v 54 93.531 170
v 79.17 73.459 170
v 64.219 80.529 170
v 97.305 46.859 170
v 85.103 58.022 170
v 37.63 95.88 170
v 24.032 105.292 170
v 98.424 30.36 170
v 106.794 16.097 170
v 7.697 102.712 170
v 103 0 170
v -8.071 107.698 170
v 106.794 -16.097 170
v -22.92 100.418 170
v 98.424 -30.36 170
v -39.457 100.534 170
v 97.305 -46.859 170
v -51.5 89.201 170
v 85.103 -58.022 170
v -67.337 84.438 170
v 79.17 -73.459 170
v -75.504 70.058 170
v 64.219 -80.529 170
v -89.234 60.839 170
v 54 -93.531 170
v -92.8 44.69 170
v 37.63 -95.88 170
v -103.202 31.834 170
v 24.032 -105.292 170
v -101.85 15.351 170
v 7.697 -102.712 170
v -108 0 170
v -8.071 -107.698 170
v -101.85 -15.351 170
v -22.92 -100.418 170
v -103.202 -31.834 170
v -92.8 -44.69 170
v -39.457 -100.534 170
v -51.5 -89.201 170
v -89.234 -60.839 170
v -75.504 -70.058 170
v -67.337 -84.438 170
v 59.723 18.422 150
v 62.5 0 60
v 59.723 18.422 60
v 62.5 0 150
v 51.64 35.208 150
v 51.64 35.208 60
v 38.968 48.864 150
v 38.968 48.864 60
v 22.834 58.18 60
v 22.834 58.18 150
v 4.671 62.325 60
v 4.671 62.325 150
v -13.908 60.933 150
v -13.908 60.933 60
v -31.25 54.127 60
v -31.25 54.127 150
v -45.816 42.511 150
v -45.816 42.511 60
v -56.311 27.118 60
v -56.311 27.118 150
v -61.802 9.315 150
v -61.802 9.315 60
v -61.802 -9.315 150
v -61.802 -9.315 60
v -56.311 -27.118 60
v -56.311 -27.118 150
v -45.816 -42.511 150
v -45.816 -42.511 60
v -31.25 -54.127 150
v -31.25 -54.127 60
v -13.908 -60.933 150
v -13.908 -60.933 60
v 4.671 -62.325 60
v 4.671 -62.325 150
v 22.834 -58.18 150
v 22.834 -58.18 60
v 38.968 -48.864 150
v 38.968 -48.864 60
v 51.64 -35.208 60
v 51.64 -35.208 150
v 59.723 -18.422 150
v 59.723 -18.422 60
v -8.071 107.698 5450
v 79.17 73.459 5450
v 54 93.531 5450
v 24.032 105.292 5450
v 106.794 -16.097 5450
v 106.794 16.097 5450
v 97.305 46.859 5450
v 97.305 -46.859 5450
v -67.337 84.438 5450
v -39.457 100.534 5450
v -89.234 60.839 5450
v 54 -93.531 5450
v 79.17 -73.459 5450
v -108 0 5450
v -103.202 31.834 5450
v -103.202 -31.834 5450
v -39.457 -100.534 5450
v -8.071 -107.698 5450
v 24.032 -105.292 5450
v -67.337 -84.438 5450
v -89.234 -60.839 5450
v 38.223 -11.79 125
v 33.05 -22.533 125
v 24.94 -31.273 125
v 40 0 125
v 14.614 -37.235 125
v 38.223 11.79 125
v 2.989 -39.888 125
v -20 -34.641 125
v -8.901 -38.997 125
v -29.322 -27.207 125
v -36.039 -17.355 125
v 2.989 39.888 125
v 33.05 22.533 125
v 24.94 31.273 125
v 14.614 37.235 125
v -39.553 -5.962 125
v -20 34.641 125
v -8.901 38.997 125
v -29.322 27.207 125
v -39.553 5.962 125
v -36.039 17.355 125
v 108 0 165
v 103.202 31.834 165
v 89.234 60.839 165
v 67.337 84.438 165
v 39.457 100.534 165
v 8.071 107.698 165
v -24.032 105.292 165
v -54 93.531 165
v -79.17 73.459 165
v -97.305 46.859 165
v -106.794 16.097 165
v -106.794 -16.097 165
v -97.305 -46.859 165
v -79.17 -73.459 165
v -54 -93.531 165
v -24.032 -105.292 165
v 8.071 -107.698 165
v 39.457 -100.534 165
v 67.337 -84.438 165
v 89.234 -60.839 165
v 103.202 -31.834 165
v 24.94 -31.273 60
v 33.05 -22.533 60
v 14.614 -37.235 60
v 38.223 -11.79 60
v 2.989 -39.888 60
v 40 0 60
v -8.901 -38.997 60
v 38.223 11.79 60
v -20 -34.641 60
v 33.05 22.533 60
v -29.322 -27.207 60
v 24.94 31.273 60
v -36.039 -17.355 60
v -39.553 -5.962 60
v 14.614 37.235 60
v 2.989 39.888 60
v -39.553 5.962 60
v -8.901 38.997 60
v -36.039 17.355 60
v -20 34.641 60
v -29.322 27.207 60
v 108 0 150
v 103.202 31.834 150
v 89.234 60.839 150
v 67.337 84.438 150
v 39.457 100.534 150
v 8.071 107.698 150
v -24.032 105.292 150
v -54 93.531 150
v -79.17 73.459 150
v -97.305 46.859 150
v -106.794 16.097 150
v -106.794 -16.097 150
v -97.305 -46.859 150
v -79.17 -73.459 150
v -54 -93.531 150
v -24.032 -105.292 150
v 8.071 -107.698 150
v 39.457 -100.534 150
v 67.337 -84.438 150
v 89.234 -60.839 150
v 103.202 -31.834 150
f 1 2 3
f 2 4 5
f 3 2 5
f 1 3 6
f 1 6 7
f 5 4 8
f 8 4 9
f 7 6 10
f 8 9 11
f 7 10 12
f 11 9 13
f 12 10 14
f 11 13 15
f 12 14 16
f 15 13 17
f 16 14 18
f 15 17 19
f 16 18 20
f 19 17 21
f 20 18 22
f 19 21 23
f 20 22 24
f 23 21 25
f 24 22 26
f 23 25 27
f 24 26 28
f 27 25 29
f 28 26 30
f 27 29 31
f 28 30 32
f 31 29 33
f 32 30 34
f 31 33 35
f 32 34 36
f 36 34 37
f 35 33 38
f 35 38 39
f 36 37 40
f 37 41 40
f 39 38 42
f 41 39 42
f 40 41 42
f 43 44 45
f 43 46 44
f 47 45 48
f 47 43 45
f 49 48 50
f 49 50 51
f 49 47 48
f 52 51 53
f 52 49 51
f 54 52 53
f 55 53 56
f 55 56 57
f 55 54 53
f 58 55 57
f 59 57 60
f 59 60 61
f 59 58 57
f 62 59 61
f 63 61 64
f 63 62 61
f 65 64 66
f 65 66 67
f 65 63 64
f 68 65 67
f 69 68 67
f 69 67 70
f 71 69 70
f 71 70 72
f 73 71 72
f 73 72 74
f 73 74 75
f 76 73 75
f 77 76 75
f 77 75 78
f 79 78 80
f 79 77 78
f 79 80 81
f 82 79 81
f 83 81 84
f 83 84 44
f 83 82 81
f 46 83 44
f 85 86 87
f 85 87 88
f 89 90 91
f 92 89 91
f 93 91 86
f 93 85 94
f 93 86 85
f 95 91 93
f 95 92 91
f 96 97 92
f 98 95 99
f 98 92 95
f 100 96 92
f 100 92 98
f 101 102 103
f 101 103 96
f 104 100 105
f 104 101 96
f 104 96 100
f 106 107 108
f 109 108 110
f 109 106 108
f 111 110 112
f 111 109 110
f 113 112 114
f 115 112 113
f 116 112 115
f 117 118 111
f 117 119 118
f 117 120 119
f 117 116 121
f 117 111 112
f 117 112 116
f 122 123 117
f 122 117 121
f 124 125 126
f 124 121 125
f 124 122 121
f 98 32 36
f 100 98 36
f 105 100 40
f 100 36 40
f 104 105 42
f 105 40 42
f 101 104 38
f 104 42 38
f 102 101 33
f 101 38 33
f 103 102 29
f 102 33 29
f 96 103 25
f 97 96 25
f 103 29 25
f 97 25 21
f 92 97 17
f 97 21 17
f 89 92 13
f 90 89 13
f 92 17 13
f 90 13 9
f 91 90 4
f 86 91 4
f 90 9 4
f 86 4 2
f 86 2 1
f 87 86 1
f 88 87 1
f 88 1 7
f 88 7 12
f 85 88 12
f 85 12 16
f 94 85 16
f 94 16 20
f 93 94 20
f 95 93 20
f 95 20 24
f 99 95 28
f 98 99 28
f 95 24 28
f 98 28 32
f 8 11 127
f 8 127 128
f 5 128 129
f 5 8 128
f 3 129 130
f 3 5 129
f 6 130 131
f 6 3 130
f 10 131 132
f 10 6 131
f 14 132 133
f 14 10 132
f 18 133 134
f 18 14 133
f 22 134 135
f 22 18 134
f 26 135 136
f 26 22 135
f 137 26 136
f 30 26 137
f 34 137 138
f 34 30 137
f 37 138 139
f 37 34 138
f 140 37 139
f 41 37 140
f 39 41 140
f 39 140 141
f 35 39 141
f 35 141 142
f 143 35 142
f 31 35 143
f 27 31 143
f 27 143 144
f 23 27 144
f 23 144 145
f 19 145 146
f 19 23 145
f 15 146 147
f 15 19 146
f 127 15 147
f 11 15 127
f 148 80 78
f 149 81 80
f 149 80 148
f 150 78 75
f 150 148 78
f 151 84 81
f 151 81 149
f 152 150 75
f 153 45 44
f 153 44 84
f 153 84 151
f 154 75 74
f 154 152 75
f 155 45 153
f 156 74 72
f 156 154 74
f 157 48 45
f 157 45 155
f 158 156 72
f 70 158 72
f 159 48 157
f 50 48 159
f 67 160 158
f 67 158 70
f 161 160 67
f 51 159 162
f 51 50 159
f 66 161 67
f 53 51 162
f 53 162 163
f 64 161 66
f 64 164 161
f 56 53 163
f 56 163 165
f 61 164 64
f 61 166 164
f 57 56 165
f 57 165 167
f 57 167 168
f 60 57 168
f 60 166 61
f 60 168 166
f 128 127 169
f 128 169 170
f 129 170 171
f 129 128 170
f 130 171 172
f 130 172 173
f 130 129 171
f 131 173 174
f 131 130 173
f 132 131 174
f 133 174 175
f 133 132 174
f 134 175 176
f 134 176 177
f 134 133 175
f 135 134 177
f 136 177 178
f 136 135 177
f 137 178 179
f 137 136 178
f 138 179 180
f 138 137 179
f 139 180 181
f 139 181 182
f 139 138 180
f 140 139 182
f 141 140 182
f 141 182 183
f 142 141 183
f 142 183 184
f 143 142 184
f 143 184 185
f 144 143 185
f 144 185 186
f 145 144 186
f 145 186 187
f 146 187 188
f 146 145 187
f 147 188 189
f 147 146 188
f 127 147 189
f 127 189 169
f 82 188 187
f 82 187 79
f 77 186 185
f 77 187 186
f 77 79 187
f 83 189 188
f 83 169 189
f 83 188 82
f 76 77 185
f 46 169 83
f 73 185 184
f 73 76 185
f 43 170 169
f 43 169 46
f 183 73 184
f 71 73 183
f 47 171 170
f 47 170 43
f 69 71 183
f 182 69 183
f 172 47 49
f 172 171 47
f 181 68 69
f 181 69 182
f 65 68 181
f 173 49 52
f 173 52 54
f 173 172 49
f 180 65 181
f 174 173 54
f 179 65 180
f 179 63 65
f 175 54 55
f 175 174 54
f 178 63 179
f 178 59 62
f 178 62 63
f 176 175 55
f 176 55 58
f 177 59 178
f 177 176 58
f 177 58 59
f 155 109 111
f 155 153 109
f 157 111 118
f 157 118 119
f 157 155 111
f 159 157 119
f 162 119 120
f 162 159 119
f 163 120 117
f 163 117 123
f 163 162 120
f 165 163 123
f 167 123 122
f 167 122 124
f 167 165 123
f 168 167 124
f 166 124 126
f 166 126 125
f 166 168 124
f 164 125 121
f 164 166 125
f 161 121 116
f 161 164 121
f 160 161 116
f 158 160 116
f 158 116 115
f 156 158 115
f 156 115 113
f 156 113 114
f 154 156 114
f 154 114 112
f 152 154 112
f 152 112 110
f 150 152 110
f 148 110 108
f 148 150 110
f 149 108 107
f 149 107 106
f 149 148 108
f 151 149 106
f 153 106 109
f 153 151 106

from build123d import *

# Parameters (mm, degrees)
CHAMFER001_SIZE = 5
SKETCH_R        = 108
PAD_DEPTH       = 5280


with BuildPart() as part:
    # Sketch002 → Revolution001 (revolve)
    with BuildSketch(Plane.XZ):
        Polygon((40, 0), (62.5, 0), (62.5, 90), (108, 90), (108, 110), (0, 110), (0, 65), (40, 65), align=None)
    revolve(axis=Axis((0, 0, 0), (0, 0, 1)))

    # Chamfer001
    chamfer001_edges = [part.edges().sort_by_distance(p)[0] for p in [
        (-108, 0, 110),
    ]]
    chamfer(chamfer001_edges, length=CHAMFER001_SIZE)

    # Sketch (on Face4 of Chamfer001) → Pad (new body)
    with BuildSketch(Plane(origin=(0, 0, 110), x_dir=(-1, 0, 0), z_dir=(0, 0, 1))):
        Circle(SKETCH_R)
    extrude(amount=PAD_DEPTH)


with BuildPart() as part_1:
    # Body001 placement: moved
    add(part.part.moved(Location((0, 0, 60))))


solid = part_1.part
